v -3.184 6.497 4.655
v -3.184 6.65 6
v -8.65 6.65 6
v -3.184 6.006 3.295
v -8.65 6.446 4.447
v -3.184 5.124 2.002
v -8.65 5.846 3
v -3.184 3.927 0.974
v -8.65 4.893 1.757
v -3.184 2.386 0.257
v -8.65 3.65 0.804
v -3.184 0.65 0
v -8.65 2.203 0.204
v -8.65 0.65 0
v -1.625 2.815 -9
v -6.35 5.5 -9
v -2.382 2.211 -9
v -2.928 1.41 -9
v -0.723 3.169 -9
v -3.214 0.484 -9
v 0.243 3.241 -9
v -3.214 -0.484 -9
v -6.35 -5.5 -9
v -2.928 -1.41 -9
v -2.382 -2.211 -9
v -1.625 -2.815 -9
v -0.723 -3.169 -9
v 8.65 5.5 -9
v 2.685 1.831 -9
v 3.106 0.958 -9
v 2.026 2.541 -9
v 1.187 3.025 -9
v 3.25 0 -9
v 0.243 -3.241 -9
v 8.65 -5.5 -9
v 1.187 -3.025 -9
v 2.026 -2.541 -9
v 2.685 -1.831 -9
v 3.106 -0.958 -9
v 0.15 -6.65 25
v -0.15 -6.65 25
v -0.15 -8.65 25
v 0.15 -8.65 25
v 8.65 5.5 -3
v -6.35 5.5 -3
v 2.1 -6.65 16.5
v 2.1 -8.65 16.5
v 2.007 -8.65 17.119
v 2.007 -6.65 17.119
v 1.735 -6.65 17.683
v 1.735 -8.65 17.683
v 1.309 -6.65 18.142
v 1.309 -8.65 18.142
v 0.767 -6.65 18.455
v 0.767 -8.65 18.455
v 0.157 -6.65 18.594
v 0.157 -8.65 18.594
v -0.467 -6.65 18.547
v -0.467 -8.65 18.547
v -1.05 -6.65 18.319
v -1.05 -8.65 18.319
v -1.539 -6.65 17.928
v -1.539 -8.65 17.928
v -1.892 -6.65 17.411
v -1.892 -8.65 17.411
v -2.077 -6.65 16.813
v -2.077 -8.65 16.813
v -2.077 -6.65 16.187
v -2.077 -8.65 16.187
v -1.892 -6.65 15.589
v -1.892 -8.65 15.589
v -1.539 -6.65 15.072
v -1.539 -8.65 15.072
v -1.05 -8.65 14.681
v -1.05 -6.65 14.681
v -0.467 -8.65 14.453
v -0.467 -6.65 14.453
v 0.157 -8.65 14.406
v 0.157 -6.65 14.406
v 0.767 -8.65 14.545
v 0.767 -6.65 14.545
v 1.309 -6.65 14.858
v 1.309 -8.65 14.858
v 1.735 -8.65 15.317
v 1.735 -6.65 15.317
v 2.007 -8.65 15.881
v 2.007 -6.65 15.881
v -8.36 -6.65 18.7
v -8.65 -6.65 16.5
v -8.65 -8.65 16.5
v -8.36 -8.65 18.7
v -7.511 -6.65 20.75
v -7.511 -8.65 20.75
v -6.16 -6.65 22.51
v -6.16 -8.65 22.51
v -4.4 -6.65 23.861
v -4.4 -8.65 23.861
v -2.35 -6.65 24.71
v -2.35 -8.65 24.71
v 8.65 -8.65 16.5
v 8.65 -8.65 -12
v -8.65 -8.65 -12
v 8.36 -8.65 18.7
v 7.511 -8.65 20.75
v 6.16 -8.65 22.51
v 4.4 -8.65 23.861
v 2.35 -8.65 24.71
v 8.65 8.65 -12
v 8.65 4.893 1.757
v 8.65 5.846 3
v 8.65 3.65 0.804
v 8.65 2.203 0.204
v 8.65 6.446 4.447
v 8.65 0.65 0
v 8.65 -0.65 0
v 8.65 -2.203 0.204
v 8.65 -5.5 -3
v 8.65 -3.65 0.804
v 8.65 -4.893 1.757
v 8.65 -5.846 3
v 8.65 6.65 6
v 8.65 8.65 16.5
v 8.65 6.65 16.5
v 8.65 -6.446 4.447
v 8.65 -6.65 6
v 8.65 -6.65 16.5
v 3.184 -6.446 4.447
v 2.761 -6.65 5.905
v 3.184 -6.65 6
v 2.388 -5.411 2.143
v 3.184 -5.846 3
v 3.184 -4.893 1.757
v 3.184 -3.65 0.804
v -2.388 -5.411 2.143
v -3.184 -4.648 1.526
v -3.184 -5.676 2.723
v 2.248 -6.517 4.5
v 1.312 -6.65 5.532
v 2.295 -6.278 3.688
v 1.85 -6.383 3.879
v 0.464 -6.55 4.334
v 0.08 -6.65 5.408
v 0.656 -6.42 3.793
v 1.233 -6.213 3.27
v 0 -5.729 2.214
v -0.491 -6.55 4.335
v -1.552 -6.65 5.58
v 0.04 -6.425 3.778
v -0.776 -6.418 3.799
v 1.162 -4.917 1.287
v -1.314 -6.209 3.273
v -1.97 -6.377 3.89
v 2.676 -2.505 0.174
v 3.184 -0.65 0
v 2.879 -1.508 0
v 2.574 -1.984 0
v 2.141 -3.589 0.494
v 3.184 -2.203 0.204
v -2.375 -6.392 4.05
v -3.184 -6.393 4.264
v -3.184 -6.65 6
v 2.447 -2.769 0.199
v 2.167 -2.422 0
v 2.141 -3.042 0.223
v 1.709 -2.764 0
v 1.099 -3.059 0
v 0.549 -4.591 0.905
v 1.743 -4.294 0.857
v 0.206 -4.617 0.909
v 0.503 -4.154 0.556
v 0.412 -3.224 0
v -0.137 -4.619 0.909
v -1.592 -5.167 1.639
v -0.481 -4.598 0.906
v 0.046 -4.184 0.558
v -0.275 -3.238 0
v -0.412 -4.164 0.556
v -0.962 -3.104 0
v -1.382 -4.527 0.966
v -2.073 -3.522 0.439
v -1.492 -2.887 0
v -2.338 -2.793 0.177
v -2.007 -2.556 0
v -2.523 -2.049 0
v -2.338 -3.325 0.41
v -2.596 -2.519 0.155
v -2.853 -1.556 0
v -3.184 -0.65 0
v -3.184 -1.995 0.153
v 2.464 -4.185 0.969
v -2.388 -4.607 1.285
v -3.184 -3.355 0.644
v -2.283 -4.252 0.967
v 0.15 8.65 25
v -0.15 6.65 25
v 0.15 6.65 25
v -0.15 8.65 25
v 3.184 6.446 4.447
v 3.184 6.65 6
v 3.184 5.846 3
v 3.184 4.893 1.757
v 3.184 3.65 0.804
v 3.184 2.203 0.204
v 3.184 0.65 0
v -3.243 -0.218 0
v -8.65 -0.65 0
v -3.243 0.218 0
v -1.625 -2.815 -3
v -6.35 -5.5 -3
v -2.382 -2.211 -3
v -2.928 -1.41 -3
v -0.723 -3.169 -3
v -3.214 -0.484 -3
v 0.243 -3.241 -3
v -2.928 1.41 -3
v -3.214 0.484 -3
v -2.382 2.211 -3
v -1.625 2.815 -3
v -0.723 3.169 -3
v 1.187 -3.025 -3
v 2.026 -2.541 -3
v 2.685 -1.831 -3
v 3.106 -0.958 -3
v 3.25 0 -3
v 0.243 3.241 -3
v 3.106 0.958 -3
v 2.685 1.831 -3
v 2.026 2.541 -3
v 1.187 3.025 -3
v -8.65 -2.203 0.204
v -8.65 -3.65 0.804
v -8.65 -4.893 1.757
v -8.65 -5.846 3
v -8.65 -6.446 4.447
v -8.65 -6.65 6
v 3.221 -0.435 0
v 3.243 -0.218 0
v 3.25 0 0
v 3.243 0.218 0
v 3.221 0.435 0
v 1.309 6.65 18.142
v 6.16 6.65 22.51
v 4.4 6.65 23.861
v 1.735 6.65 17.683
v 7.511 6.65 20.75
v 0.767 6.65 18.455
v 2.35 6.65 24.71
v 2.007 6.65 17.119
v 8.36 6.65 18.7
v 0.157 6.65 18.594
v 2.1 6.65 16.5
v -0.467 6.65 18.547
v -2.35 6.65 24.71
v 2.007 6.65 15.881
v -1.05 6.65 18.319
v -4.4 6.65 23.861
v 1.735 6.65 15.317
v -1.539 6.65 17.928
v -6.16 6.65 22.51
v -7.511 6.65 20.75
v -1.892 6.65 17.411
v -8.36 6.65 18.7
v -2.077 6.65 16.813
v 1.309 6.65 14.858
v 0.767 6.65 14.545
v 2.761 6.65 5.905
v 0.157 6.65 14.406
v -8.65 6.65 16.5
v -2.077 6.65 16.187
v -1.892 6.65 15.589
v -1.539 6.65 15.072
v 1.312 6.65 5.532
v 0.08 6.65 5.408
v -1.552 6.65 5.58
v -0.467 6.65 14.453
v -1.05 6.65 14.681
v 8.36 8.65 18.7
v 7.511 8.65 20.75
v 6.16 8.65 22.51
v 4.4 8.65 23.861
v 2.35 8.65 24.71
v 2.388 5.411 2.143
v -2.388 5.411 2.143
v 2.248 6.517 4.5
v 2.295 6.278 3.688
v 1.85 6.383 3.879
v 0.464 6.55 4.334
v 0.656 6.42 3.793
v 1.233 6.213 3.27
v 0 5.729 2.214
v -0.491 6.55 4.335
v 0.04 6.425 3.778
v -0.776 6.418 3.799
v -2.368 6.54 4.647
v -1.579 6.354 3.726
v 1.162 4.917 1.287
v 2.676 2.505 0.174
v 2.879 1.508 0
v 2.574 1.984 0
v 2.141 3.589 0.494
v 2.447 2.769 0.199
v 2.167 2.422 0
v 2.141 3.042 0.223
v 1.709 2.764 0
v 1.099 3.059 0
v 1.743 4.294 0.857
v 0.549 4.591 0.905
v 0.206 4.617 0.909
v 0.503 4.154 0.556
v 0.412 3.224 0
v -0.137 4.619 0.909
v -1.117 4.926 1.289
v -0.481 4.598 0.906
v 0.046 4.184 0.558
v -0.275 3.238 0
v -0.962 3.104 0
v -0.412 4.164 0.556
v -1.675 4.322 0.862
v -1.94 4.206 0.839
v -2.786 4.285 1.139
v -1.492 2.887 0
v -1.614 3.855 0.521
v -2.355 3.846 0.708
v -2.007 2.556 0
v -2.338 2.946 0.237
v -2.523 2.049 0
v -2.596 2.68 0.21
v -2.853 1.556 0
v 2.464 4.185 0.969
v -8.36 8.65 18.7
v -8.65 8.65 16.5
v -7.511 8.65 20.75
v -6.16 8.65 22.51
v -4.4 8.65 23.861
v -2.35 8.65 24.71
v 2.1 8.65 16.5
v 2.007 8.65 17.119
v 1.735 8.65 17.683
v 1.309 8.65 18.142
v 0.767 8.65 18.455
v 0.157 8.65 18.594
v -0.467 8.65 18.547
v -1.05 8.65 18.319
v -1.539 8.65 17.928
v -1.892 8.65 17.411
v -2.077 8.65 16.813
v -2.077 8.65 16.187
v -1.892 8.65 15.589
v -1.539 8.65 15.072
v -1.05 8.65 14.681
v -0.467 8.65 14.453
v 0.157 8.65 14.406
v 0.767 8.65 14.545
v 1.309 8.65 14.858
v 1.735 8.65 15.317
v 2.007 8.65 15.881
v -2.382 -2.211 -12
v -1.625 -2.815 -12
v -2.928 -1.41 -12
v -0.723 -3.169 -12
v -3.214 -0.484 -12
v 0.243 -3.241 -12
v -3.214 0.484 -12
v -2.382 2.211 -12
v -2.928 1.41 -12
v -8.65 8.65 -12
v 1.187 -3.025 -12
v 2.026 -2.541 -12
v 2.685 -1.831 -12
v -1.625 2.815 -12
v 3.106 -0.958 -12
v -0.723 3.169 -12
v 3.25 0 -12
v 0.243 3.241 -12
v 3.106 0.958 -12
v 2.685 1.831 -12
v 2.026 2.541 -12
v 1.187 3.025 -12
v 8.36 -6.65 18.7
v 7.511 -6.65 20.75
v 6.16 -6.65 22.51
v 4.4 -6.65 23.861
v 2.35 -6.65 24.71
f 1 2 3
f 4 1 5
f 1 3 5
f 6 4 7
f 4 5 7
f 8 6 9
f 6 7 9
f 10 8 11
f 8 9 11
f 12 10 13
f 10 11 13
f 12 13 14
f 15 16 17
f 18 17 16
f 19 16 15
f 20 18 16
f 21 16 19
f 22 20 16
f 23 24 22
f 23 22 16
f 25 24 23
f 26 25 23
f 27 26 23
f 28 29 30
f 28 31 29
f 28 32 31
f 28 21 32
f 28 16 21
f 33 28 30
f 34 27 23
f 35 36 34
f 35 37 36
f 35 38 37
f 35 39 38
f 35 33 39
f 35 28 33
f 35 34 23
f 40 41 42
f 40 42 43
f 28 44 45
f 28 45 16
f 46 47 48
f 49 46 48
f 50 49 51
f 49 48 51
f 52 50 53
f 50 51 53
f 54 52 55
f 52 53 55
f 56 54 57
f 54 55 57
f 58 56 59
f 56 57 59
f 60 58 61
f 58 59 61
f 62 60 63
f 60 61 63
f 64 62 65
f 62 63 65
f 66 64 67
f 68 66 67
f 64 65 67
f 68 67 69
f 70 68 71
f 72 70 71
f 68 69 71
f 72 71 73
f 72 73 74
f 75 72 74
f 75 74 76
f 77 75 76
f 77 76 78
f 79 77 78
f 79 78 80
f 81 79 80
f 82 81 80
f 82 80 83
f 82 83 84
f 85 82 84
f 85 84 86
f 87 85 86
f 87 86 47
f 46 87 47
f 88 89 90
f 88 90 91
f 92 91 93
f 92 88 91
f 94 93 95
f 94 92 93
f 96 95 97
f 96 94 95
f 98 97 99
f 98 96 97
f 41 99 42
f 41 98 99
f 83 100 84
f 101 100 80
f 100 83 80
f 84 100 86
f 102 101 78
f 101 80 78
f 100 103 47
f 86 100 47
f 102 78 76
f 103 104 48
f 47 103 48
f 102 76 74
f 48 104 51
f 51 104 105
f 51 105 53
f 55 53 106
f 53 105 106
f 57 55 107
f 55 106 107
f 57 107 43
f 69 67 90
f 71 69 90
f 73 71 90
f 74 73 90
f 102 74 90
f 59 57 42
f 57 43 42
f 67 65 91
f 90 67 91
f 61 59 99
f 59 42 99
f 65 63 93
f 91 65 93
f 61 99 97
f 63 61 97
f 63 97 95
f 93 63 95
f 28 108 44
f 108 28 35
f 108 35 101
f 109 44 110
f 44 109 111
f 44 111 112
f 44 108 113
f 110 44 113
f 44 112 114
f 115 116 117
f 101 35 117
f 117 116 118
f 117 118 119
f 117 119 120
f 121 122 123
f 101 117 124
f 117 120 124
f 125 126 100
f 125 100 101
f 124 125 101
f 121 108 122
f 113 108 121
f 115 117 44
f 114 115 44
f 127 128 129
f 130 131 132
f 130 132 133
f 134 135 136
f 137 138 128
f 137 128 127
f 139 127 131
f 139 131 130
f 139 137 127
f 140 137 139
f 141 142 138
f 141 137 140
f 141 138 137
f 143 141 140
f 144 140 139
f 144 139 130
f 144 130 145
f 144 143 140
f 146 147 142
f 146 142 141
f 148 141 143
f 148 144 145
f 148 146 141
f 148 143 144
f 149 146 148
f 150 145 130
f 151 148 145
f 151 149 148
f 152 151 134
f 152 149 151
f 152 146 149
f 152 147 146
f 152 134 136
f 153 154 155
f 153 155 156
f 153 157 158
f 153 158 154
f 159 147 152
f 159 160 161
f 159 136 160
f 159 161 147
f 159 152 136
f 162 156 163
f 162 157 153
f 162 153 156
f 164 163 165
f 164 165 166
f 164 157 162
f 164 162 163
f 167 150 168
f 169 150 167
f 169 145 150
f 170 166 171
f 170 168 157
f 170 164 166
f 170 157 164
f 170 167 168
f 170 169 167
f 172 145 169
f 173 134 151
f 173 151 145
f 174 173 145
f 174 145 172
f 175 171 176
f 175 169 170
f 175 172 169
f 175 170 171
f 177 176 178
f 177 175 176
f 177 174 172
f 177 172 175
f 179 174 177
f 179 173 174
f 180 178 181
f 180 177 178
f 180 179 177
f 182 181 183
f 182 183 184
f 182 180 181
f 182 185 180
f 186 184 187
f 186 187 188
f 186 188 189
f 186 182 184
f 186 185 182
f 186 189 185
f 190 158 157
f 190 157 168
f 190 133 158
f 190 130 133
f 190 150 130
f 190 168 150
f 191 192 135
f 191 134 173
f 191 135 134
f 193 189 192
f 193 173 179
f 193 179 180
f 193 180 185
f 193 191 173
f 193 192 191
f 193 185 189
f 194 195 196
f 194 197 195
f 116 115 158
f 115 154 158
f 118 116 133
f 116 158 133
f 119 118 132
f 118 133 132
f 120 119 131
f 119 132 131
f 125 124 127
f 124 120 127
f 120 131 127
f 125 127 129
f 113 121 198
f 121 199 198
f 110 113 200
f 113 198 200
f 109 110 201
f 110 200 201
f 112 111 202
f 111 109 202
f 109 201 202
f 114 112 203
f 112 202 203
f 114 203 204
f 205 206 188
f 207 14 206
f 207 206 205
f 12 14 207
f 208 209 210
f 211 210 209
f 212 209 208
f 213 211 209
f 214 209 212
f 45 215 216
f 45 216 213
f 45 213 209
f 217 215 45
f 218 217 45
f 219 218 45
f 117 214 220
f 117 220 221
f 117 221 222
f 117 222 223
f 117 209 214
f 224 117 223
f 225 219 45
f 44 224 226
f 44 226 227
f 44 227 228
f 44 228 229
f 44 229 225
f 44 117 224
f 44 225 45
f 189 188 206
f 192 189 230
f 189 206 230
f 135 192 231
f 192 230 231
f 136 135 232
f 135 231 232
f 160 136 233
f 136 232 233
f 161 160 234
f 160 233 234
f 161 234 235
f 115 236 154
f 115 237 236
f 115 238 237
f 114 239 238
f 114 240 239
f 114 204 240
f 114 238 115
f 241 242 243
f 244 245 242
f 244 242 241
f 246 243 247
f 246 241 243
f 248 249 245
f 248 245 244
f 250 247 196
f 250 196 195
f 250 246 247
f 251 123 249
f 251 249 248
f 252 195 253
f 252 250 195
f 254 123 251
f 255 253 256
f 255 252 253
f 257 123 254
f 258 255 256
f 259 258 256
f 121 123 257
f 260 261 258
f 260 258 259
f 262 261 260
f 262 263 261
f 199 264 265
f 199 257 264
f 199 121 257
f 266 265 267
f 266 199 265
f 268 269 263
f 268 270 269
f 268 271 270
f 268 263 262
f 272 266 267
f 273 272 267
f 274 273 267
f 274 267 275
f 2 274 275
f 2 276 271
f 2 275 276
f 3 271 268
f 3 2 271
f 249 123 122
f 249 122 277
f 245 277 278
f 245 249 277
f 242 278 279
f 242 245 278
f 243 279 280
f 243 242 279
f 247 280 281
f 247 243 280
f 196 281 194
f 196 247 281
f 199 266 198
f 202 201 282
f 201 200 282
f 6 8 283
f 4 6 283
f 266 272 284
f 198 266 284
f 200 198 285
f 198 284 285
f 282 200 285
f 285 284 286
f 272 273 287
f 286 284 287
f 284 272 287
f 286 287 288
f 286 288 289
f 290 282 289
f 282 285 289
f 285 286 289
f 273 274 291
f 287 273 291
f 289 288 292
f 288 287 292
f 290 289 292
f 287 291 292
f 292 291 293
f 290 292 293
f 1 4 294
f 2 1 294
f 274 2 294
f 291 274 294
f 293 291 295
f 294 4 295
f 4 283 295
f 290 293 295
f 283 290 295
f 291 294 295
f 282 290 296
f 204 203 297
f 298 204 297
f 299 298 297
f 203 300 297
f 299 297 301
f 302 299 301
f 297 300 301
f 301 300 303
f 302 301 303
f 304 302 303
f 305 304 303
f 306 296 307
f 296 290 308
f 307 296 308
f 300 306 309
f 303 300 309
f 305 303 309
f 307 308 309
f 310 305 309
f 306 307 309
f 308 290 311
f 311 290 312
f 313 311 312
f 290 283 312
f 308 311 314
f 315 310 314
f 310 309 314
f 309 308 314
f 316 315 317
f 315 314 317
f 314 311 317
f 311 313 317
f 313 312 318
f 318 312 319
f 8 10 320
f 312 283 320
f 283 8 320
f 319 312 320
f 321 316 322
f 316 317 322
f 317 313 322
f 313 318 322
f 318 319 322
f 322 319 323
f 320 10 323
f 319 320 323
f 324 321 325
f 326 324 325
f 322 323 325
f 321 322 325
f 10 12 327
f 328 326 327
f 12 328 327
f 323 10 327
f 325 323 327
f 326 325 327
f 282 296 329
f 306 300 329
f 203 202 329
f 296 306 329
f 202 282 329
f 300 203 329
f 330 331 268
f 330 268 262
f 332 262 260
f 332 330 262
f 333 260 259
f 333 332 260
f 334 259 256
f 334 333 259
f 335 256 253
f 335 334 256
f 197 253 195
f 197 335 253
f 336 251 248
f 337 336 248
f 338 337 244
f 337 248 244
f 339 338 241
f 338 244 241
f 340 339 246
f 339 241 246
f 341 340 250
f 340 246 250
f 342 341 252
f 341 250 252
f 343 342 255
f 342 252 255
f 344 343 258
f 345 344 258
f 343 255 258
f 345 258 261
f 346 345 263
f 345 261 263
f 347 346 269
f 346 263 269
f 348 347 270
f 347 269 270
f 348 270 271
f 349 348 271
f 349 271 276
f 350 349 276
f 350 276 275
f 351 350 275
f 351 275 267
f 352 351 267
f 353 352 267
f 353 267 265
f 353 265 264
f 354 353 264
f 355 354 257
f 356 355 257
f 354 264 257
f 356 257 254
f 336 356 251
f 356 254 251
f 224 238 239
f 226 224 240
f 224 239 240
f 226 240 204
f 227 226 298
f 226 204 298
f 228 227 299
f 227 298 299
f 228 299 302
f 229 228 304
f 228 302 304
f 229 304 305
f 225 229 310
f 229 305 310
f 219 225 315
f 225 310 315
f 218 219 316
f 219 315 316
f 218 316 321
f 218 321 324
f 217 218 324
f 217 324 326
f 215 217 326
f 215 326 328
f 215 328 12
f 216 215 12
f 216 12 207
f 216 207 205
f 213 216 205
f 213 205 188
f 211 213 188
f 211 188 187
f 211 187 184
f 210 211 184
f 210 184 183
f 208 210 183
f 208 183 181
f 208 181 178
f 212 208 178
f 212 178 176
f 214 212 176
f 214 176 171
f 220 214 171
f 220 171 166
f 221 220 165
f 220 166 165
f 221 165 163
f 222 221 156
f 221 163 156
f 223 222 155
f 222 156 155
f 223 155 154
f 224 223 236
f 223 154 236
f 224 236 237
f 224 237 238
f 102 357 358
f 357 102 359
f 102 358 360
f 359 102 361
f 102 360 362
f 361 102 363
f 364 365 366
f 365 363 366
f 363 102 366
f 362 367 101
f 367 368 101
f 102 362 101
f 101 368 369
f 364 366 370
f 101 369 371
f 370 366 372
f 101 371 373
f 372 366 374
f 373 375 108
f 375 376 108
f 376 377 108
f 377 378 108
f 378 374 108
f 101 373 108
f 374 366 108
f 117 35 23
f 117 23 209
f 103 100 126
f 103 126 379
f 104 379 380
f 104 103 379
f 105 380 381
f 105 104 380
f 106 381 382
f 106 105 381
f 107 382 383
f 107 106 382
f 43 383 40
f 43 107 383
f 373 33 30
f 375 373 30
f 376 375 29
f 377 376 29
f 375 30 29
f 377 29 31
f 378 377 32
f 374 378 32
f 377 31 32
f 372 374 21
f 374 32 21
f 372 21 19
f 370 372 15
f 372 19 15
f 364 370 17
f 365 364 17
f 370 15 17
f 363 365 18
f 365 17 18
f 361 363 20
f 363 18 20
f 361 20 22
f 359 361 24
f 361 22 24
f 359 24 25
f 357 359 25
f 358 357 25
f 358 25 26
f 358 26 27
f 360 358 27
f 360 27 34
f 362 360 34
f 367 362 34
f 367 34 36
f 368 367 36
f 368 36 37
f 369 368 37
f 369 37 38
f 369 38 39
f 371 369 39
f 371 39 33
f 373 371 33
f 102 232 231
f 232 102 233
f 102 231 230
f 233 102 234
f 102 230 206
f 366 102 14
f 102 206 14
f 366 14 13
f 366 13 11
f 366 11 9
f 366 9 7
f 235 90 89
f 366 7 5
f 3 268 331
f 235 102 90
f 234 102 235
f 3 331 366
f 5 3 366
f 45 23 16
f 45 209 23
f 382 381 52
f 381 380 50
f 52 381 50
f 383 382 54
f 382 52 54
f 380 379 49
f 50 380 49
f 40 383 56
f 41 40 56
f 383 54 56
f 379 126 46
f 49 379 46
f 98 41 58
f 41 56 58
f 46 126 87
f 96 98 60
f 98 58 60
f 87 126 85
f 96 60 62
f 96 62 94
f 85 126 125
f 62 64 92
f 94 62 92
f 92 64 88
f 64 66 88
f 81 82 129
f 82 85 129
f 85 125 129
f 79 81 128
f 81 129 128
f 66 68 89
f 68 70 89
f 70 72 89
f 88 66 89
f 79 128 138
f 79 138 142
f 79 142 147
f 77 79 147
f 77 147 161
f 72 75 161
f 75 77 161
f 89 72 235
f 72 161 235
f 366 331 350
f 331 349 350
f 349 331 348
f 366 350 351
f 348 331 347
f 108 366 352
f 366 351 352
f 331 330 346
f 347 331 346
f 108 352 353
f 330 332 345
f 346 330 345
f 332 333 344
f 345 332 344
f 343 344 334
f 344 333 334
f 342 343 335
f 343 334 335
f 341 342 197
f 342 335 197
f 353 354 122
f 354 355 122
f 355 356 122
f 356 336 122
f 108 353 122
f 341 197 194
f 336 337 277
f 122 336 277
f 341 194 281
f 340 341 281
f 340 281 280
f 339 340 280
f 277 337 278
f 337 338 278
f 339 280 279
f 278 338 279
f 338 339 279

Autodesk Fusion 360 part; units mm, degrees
sketch "Sketch1" plane through (0, 0, 0) normal (0, 0, 1) x (1, 0, 0)
  line L0 (8.65, -8.65) -> (-8.65, -8.65)
  line L1 (-8.65, -8.65) -> (-8.65, 8.65)
  line L2 (-8.65, 8.65) -> (8.65, 8.65)
  line L3 (8.65, 8.65) -> (8.65, -8.65)
  line L4 (8.65, -8.65) -> (-8.65, 8.65) construction
  line L5 (-8.65, -8.65) -> (8.65, 8.65) construction
  circle A0 centre (0, 0) radius 3.25
  line L6 (-8.65, 8.65) -> (8.65, 8.65)
  line L7 (8.65, 8.65) -> (8.65, 6.65)
  line L8 (8.65, 6.65) -> (-8.65, 6.65)
  line L9 (-8.65, 6.65) -> (-8.65, 8.65)
  line L10 (-8.65, -8.65) -> (8.65, -8.65)
  line L11 (8.65, -8.65) -> (8.65, -6.65)
  line L12 (8.65, -6.65) -> (-8.65, -6.65)
  line L13 (-8.65, -6.65) -> (-8.65, -8.65)
  dimension "d4" = 6.5
  dimension "d10" = 2
  dimension "d11" = 2
  dimension "d12" = 13.3
extrude "Extrude2" add sketch "Sketch1" against normal blind 12
extrude "Extrude3" add sketch "Sketch1" along normal blind 25 contours L0 L1 L3 L10 L11 L12 L13 | L1 L2 L3 L6 L7 L8 L9
fillet "Fillet1" radius 8.5 4 edges at (8.65, -7.65, 25) (-8.65, -7.65, 25) (-8.65, 7.65, 25) (8.65, 7.65, 25)
sketch "Sketch3" plane through (0, -8.65, 0) normal (0, -1, 0) x (1, 0, 0)
  arc A0 (-0.15, 25) -> (-8.65, 16.5) centre (-0.15, 16.5) ccw
  line L0 (-8.65, 16.5) -> (-8.65, -12)
  line L1 (-8.65, -12) -> (8.65, -12)
  line L2 (8.65, -12) -> (8.65, 16.5)
  arc A1 (8.65, 16.5) -> (0.15, 25) centre (0.15, 16.5) ccw
  line L3 (0.15, 25) -> (-0.15, 25)
  line L4 (-8.65, 16.5) -> (8.65, 16.5) construction
  line L5 (0, 0) -> (0, 16.5) construction
  circle A2 centre (0, 16.5) radius 2.1
  line L6 (8.65, 0) -> (-8.65, 0)
  dimension "d19" = 4.2
  dimension "d21" = 11.5
extrude "Extrude4" cut sketch "Sketch3" against normal through all contours A2
sketch "Sketch7" plane through (8.65, 0, 0) normal (1, 0, 0) x (0, 1, 0)
  line L0 (8.65, 16.5) -> (6.65, 16.5)
  line L1 (6.65, 16.5) -> (6.65, 0)
  line L2 (6.65, 0) -> (-6.65, 0)
  line L3 (-6.65, 0) -> (-6.65, 16.5)
  line L4 (-6.65, 16.5) -> (-8.65, 16.5)
  line L5 (-8.65, 16.5) -> (-8.65, -12)
  line L6 (-8.65, -12) -> (8.65, -12)
  line L7 (8.65, -12) -> (8.65, 16.5)
  line L8 (0, 0) -> (8.65, 0) construction
  line L9 (8.65, 0) -> (-8.65, -12) construction
  line L10 (5.5, -9) -> (-5.5, -9)
  line L11 (-5.5, -9) -> (-5.5, -3)
  line L12 (-5.5, -3) -> (5.5, -3)
  line L13 (5.5, -3) -> (5.5, -9)
  line L14 (5.5, -9) -> (-5.5, -3) construction
  line L15 (-5.5, -9) -> (5.5, -3) construction
  point P0 (0, -6)
  dimension "d27" = 11
  dimension "d28" = 6
extrude "Extrude5" cut sketch "Sketch7" against normal blind 15 contours L10 L11 L12 L13
fillet "Fillet2" radius 6 2 edges at (0, 6.65, 0) (0, -6.65, 0)
